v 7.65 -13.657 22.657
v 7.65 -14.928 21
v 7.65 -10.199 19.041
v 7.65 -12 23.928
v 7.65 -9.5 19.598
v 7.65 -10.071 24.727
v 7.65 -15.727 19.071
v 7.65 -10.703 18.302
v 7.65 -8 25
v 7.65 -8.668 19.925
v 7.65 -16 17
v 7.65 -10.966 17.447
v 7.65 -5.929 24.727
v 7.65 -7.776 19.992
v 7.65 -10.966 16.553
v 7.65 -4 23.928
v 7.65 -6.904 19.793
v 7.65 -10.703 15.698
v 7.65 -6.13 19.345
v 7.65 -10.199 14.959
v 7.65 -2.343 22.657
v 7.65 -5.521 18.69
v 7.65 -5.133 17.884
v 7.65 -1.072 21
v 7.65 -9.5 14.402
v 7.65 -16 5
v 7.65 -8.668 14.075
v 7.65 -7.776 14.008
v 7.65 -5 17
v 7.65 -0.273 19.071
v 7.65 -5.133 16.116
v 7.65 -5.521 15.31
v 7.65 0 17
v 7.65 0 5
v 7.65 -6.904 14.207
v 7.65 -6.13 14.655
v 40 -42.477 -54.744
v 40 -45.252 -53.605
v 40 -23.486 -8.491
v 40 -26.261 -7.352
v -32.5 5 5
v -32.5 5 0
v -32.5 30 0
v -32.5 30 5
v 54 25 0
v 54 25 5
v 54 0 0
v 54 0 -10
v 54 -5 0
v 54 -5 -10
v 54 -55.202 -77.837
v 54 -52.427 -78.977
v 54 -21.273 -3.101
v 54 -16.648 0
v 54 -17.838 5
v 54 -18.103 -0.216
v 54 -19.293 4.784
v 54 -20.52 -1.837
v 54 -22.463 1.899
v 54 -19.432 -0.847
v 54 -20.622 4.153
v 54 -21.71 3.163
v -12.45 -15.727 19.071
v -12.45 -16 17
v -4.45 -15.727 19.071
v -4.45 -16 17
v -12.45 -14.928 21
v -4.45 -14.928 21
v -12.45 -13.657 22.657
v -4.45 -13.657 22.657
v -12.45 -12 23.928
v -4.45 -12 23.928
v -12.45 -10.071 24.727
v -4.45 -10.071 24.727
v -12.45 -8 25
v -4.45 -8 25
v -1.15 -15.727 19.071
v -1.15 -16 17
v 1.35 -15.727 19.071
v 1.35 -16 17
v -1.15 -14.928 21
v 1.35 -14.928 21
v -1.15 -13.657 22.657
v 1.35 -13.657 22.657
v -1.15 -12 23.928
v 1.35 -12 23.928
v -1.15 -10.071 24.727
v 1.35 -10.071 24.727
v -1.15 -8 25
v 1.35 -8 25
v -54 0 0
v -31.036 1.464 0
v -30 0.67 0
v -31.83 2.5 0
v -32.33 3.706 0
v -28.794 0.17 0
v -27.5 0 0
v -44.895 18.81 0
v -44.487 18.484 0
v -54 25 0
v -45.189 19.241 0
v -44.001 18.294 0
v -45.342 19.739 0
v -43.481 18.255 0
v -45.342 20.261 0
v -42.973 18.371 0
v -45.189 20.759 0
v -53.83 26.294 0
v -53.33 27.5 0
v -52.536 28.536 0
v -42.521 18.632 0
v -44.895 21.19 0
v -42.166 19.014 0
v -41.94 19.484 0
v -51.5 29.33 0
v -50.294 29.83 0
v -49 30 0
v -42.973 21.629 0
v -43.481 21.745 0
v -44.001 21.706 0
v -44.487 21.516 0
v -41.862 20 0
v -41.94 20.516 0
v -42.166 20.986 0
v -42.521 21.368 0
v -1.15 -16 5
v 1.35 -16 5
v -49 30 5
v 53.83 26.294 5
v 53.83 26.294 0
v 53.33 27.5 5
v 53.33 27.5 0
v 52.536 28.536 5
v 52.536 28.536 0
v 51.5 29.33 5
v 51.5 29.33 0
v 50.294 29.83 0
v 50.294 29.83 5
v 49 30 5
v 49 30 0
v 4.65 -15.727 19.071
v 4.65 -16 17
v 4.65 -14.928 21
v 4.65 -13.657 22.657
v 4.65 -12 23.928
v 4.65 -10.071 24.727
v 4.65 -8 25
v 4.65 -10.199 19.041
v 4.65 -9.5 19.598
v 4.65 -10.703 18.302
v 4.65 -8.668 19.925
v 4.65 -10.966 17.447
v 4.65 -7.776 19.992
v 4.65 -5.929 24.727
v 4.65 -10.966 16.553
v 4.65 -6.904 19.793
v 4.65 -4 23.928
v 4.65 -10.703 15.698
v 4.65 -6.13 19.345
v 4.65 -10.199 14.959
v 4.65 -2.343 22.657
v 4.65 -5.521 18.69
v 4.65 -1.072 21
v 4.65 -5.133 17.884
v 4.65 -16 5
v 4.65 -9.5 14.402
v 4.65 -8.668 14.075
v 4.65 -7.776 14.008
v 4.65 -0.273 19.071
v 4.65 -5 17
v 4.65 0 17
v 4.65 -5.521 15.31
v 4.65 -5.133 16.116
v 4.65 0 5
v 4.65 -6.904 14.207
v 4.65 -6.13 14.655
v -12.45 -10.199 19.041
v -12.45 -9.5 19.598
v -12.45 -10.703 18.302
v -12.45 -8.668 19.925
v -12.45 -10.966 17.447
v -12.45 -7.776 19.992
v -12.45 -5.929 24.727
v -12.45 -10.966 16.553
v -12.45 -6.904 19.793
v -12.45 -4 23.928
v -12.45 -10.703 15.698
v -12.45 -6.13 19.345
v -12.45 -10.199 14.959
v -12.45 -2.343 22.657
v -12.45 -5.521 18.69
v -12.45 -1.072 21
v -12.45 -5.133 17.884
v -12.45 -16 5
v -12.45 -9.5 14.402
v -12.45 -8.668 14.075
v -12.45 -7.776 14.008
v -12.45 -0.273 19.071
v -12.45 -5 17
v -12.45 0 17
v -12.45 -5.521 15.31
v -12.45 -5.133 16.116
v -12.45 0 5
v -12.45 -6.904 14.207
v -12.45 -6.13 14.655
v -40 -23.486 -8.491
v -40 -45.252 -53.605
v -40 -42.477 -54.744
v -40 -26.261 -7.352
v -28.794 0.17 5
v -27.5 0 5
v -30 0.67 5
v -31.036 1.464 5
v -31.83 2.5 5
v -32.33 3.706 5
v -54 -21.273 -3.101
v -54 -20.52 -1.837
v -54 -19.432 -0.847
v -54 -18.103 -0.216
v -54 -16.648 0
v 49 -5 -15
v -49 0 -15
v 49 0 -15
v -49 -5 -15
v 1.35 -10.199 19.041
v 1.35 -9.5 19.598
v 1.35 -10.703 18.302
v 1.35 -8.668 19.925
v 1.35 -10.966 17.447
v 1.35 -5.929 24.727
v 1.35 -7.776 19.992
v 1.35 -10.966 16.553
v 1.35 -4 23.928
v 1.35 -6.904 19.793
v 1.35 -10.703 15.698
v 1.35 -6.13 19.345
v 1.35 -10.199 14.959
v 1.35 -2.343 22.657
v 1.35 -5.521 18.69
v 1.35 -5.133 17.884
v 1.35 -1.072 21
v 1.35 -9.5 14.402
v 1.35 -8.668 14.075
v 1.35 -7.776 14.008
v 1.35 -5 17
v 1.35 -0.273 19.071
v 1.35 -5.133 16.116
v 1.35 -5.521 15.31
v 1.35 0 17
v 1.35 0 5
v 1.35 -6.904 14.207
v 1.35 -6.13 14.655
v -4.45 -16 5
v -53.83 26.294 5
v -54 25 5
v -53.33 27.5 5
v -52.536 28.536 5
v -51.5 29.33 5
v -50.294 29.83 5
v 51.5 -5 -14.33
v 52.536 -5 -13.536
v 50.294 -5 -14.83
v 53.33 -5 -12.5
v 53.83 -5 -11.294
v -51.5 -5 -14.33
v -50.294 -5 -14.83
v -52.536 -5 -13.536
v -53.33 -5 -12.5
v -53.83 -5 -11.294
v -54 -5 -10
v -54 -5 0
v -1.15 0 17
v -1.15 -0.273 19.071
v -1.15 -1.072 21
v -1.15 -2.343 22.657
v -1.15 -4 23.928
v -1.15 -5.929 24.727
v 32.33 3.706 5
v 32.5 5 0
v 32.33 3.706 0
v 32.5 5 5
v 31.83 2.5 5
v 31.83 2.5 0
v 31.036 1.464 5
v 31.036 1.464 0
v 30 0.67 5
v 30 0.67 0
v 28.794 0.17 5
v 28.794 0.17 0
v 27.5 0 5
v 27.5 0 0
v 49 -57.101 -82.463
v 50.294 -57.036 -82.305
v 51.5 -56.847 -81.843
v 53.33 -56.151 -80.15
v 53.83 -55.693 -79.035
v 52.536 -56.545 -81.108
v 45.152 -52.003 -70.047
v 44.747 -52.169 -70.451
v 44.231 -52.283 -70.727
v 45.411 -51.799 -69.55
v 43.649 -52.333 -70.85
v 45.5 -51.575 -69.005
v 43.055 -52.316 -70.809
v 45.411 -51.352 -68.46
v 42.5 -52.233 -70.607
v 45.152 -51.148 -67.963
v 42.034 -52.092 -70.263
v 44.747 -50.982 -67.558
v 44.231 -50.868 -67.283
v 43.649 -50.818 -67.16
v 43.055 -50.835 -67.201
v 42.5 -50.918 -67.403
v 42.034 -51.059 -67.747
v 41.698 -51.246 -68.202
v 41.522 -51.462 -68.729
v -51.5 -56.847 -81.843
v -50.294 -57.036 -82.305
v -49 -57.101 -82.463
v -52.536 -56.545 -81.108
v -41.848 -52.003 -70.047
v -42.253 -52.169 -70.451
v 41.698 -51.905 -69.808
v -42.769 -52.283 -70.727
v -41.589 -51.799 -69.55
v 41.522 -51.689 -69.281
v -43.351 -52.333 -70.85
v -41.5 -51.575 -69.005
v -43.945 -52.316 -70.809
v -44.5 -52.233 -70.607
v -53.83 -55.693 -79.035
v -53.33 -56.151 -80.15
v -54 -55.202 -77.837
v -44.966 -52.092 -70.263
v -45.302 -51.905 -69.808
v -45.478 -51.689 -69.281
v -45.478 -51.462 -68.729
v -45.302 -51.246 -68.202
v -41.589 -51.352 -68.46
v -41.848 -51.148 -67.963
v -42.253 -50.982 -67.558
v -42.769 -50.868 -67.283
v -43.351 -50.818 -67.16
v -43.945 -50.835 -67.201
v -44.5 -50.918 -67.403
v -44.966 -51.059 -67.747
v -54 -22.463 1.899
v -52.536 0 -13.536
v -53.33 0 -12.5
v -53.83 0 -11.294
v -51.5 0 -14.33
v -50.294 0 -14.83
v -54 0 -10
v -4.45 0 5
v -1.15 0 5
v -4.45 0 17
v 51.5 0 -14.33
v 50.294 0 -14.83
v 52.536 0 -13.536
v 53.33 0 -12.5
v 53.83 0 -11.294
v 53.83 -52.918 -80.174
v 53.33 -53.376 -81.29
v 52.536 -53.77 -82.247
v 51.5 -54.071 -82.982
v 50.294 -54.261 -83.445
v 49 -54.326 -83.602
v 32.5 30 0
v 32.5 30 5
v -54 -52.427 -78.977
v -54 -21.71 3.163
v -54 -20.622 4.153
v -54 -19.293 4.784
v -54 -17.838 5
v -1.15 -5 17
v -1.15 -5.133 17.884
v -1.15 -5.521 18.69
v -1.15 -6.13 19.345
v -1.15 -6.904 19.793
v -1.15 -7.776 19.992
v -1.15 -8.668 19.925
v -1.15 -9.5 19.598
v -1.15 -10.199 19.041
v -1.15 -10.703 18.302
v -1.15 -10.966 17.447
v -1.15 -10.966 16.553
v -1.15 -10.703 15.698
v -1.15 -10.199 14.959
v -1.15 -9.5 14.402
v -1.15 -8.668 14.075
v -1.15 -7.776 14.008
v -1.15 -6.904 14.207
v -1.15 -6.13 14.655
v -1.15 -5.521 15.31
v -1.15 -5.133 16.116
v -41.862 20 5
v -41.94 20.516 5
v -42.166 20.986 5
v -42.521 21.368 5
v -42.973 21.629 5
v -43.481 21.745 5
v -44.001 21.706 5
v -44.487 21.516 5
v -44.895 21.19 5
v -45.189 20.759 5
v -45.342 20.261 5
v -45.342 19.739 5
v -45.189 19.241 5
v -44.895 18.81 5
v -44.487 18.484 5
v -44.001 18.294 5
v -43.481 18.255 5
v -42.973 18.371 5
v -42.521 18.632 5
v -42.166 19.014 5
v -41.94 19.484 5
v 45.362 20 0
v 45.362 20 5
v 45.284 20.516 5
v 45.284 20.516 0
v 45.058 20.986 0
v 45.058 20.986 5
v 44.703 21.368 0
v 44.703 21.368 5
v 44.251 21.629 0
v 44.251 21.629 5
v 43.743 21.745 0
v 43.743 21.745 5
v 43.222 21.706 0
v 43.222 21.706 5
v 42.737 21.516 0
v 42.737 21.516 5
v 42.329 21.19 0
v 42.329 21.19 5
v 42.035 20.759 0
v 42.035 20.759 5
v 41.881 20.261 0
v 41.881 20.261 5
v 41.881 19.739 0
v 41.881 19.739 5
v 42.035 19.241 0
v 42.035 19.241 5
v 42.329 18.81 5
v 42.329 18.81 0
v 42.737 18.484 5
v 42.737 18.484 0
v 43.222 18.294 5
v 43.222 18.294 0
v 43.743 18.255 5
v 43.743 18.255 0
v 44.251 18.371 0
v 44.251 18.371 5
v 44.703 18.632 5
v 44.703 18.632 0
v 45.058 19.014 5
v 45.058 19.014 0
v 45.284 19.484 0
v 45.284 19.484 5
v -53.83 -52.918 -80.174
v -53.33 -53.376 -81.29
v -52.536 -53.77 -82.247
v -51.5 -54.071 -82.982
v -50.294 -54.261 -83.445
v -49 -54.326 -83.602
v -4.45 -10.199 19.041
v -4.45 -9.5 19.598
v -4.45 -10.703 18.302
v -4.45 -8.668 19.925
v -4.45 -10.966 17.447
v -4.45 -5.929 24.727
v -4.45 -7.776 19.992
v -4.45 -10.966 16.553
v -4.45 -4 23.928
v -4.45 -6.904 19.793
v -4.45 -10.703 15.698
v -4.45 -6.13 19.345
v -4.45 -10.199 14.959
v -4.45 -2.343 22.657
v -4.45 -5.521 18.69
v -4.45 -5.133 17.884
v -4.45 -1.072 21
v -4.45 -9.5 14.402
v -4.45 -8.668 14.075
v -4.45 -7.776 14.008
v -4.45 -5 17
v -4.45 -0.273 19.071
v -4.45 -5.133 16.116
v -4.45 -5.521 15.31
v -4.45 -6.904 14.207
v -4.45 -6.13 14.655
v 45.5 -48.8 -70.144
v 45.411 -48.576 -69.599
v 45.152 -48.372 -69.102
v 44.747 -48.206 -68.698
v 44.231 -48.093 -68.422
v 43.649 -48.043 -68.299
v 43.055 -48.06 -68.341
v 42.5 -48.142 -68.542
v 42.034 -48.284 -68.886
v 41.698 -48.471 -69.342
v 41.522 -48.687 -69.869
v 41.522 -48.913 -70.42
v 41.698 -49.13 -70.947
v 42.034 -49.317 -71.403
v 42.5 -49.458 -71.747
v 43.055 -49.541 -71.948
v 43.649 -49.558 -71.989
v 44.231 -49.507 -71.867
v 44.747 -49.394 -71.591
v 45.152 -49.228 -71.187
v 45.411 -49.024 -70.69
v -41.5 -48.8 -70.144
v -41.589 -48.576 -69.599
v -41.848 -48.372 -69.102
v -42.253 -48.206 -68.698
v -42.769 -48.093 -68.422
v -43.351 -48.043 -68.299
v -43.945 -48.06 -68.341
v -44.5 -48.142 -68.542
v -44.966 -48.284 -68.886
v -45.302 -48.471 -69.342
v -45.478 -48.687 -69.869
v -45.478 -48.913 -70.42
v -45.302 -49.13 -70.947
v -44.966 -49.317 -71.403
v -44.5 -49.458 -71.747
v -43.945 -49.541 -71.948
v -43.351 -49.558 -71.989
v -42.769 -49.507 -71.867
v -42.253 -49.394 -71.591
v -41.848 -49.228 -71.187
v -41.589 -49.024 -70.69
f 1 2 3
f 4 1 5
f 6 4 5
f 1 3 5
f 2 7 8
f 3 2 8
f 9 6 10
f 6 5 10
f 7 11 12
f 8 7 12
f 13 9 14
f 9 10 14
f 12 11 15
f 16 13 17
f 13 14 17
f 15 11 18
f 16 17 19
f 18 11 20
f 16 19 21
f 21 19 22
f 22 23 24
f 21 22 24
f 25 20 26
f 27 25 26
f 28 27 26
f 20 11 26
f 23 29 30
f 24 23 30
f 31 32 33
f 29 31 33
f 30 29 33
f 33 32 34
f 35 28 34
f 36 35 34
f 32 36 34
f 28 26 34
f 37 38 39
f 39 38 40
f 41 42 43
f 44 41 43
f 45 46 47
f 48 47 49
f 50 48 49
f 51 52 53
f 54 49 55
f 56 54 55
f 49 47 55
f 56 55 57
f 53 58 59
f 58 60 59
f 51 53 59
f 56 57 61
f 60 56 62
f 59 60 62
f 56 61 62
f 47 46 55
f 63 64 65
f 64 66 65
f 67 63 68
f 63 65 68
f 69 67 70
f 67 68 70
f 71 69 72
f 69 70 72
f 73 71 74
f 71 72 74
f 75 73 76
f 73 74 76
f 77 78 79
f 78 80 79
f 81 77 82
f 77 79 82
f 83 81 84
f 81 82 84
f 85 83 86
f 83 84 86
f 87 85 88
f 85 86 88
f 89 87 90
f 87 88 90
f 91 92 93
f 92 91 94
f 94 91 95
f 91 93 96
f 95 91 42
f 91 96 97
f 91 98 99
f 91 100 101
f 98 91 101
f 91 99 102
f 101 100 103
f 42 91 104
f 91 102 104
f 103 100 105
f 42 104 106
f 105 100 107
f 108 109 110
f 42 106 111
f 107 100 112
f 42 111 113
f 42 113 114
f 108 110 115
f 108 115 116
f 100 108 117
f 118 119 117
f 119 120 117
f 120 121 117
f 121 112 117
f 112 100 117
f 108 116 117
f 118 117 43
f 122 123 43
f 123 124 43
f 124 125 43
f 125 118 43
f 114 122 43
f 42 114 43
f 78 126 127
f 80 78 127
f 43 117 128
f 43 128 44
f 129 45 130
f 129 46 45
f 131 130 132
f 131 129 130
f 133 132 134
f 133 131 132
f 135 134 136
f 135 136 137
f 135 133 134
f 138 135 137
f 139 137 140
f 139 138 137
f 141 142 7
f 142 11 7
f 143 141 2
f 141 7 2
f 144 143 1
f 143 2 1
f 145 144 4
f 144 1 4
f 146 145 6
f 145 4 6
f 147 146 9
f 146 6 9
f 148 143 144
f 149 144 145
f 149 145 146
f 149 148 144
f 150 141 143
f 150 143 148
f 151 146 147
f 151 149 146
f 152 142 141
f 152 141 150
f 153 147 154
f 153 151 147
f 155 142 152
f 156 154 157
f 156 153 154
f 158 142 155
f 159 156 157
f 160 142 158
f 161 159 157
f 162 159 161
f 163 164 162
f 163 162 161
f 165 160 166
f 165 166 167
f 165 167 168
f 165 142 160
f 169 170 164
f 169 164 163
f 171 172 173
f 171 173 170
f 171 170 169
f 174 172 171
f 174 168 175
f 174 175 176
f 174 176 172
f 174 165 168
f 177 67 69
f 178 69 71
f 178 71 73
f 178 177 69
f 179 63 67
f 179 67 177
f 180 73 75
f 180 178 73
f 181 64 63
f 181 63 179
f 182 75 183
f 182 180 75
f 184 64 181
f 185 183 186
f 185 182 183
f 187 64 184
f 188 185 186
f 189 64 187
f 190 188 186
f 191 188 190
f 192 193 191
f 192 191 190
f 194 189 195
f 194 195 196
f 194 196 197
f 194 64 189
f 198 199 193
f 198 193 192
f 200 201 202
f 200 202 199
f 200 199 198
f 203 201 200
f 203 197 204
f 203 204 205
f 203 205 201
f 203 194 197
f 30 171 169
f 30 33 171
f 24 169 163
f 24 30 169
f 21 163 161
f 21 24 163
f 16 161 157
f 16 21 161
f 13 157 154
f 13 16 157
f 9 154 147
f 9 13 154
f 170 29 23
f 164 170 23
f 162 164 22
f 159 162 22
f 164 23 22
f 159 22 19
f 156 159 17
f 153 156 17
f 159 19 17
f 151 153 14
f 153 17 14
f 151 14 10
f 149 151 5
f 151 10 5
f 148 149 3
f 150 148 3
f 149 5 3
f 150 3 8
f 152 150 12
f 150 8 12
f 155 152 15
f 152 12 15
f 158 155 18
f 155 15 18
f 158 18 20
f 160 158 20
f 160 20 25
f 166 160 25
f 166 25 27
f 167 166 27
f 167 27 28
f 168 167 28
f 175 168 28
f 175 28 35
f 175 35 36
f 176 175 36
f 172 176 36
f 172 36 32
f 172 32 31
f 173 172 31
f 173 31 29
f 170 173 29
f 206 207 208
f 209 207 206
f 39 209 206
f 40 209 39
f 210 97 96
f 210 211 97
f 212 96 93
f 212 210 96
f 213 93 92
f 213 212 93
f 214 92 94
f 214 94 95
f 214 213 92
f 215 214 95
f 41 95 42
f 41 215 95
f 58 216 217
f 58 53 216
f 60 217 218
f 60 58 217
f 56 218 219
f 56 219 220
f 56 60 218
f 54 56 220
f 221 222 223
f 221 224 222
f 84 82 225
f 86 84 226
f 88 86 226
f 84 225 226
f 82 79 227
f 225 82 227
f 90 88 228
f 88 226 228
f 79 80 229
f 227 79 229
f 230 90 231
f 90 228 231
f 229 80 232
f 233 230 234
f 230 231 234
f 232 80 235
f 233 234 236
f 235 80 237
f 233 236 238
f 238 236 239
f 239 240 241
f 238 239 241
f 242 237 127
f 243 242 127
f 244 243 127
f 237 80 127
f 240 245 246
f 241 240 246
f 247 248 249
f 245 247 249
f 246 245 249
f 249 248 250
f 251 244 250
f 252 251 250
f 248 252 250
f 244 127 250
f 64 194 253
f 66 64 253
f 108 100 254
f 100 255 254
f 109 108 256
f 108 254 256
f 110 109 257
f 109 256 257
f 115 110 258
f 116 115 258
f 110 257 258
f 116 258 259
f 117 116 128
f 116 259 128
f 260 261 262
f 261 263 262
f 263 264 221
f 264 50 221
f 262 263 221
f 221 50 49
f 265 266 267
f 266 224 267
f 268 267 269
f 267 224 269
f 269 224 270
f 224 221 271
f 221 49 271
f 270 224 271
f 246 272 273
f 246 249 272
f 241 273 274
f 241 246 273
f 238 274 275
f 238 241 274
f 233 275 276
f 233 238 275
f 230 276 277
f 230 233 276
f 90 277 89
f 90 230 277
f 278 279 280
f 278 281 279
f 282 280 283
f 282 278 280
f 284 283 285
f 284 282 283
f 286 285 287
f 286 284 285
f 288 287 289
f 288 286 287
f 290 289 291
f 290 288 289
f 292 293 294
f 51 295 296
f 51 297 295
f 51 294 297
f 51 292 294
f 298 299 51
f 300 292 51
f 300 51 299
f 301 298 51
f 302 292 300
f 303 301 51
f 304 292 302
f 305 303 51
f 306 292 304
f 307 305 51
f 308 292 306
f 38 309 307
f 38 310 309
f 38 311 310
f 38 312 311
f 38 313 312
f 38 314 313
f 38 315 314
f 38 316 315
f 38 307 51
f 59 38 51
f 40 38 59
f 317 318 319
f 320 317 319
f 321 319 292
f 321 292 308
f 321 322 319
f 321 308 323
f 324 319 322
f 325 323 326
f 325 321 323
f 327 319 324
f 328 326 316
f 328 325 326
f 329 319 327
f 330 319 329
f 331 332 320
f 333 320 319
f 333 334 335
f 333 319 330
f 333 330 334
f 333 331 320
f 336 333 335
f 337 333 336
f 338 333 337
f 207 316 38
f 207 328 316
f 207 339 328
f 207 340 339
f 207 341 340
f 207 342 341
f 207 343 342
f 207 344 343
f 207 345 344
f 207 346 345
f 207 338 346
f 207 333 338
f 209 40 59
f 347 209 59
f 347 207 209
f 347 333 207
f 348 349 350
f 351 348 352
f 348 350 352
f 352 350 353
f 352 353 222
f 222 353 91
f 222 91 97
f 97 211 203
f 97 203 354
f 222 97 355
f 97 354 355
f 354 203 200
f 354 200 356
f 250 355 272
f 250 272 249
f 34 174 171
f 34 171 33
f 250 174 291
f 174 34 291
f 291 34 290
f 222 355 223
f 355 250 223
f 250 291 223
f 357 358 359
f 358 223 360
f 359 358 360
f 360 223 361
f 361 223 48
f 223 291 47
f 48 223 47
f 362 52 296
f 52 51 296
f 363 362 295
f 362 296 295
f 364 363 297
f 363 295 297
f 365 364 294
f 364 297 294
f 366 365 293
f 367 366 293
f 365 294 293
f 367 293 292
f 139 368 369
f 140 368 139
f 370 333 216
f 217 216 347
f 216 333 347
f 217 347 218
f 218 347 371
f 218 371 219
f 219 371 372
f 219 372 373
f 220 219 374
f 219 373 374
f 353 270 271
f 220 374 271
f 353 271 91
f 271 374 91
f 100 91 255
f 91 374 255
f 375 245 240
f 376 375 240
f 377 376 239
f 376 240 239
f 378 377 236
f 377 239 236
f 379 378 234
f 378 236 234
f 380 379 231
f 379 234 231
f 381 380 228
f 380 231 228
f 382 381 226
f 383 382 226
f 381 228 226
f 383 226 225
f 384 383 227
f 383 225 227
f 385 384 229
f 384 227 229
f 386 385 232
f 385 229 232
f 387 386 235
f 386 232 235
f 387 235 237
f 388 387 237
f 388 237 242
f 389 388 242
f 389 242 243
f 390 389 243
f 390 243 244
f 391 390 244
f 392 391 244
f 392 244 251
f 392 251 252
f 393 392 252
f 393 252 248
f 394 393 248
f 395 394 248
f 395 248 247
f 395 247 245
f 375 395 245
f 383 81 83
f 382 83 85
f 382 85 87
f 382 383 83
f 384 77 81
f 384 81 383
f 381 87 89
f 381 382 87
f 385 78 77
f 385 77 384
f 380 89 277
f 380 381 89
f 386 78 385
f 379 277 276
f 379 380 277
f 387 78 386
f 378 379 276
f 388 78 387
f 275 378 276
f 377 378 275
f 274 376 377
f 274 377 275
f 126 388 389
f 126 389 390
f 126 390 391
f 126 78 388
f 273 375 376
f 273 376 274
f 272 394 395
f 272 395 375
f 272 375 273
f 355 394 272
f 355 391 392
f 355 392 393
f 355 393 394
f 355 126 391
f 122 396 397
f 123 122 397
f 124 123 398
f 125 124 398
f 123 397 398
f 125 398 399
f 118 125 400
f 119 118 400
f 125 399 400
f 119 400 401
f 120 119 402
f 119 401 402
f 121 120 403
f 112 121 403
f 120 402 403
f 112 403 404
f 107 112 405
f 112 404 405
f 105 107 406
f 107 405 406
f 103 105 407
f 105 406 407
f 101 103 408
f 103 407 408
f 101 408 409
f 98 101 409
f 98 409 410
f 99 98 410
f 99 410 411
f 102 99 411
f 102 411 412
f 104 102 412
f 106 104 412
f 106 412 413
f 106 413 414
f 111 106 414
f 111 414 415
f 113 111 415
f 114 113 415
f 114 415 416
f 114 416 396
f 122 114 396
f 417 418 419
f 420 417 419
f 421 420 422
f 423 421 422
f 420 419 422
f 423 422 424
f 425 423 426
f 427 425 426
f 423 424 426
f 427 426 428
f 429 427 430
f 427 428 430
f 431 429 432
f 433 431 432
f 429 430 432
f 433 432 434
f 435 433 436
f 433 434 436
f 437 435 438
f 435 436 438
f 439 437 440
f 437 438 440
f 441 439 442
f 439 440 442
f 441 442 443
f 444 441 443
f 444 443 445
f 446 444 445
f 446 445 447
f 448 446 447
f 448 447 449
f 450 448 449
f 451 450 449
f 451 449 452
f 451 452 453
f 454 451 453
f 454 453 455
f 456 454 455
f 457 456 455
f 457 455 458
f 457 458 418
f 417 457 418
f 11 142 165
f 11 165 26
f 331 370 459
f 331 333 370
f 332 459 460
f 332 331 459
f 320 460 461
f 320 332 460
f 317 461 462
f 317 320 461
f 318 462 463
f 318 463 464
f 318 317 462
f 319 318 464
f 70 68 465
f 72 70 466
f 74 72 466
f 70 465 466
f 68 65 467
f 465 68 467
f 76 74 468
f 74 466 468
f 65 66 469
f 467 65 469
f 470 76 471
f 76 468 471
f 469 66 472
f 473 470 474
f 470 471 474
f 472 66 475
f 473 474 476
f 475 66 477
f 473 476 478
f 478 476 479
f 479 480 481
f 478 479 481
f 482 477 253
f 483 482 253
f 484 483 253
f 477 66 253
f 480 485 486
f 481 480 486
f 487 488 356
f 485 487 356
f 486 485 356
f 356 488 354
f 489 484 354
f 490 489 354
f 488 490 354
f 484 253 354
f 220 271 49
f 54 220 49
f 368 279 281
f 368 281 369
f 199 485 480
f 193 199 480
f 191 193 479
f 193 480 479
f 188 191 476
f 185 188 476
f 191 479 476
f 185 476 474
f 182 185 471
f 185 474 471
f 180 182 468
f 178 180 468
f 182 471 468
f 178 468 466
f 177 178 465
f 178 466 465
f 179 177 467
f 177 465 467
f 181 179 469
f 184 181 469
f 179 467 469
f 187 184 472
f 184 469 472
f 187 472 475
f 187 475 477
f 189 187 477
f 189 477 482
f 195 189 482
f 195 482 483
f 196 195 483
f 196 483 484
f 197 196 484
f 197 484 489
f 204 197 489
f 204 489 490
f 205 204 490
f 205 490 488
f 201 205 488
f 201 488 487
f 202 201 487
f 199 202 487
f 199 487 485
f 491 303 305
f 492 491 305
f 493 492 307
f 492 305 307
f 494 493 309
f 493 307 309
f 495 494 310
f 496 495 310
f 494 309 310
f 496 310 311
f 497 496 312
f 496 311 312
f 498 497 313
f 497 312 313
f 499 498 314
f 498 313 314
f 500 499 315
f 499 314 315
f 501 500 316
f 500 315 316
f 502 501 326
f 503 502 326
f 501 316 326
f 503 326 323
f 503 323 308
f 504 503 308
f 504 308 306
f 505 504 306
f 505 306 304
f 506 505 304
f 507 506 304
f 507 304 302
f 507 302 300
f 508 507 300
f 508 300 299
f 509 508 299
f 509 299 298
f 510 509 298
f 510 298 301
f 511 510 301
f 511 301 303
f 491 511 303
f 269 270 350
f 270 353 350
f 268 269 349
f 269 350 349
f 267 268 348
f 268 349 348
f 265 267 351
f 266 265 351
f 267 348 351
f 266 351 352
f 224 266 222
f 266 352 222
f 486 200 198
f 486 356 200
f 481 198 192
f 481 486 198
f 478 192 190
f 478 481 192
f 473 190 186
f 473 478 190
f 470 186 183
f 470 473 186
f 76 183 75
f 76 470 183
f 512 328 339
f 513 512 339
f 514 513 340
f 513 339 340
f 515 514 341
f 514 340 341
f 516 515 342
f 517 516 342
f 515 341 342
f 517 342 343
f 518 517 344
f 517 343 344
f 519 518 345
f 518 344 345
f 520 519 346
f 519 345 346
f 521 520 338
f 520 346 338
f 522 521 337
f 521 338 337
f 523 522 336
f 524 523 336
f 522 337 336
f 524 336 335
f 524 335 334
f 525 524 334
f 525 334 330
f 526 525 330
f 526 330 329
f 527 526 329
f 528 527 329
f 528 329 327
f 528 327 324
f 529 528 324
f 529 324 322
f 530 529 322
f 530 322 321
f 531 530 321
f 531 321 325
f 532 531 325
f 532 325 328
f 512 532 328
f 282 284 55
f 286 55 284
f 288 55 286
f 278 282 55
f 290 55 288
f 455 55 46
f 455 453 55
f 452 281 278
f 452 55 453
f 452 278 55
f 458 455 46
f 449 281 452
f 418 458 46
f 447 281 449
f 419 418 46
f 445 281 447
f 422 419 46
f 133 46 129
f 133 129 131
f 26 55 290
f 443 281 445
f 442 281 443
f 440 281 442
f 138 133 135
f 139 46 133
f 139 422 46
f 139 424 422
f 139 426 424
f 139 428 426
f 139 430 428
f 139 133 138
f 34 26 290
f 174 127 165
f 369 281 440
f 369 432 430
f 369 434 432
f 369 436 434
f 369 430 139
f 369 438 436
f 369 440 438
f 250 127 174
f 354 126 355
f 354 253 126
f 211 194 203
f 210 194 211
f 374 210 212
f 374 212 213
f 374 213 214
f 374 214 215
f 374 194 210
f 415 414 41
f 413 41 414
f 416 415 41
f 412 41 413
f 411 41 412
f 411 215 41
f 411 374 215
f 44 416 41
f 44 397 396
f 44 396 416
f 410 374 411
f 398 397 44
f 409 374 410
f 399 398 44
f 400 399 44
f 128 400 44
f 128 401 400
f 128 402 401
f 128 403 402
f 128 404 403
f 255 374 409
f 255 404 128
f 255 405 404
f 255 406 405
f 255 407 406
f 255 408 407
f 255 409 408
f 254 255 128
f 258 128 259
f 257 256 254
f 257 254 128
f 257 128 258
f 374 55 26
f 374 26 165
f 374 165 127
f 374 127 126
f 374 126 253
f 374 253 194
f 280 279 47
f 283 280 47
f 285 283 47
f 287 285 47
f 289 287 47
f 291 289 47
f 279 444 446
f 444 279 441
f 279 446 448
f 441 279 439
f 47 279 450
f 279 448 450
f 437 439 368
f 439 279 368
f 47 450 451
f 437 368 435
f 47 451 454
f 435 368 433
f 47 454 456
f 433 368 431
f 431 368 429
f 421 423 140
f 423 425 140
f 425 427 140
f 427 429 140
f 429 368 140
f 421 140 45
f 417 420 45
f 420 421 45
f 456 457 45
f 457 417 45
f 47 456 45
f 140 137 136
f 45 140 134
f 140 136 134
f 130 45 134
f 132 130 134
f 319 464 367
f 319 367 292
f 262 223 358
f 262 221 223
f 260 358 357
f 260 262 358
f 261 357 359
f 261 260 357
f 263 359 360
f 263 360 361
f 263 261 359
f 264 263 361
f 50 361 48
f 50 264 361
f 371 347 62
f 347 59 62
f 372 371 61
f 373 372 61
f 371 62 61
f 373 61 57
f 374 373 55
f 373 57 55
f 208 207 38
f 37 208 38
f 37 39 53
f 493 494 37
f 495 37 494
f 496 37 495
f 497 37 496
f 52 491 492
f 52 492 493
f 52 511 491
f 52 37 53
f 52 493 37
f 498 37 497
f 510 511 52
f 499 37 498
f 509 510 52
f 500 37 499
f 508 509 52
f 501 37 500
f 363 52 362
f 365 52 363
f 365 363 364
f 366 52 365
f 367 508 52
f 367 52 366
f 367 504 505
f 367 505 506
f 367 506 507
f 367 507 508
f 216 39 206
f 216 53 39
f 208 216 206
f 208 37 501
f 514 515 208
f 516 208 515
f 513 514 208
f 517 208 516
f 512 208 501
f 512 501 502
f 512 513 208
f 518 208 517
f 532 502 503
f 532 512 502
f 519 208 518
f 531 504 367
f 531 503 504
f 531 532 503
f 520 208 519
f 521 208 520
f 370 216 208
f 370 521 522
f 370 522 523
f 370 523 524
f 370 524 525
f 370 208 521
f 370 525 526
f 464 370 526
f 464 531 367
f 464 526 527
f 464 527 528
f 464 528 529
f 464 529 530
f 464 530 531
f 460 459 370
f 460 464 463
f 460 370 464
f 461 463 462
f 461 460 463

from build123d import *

# Parameters (mm, degrees)
F0_W      = 21.5
F0_H      = 30
F1_DEPTH  = 5
F3_DEPTH  = 108
F4_R      = 2
F5_DEPTH  = 25
F7_R      = 5
F6_W      = 8
F6_H      = 16
F6_W_2    = 2.5
F6_W_3    = 3
F8_DEPTH  = 20
F9_R      = 7.99999
F10_R     = 3
F11_DEPTH = 40
F12_W     = 80
F12_H     = 50
F13_DEPTH = 25
F15_DEPTH = 15
F16_R     = 5
F17_R     = 1.75
F18_DEPTH = 25


# Not quite as in the source:
# - a fillet or chamfer is up to 0.001 mm smaller than in the source, because OpenCascade refuses the exact size


with BuildPart() as f1:
    # F0 (on Top) → F1 (new body)
    with BuildSketch(Plane.XY):
        with Locations((-43.25, 15)):
            Rectangle(F0_W, F0_H)
        Polygon((-32.5, 0), (-54, 0), (-54, -20), (54, -20), (54, 0), (32.5, 0), align=None)
        with Locations((43.25, 15)):
            Rectangle(F0_W, F0_H)
    extrude(amount=F1_DEPTH)

    # F2 (on face) → F3 (join)
    with BuildSketch(Plane(origin=(-54, 0, 0), x_dir=(0, -1, 0), z_dir=(-1, 0, 0))):
        Polygon((20, 5), (20, 0), (54.3258497444, -83.6021589144), (57.101034605, -82.4627077355), (21.1900987758, 5), align=None)
    extrude(amount=-F3_DEPTH)

    # F4 (on face) → F5 (cut)
    with BuildSketch(Plane(origin=(0, -19.8899648845, 8.1665348708), x_dir=(1, 0, 0), z_dir=(0, -0.9250616202, 0.3798170597))):
        with Locations((-43.5, -83.4230529098)):
            Circle(F4_R)
        with Locations((43.5, -83.4230529098)):
            Circle(F4_R)
    extrude(amount=-F5_DEPTH, mode=Mode.SUBTRACT)

    # F7
    f7_edges = [f1.edges().sort_by_distance(p)[0] for p in [
        (0, -21.190099, 5),
        (0, -20, 0),
        (-54, 30, 2.5),
        (54, 30, 2.5),
        (54, -55.713442, -83.032433),
        (-54, -55.713442, -83.032433),
        (-32.5, 0, 2.5),
        (32.5, 0, 2.5),
    ]]
    fillet(f7_edges, radius=F7_R)

    # F6 (on face) → F8 (join)
    with BuildSketch(Plane.XY.offset(5)):
        with Locations((-8.45, -8)):
            Rectangle(F6_W, F6_H)
        with Locations((0.1, -8)):
            Rectangle(F6_W_2, F6_H)
        with Locations((6.15, -8)):
            Rectangle(F6_W_3, F6_H)
    extrude(amount=F8_DEPTH)

    # F9 (radius 8 in the source; OpenCascade refuses exactly that, so slightly less here)
    f9_edges = [f1.edges().sort_by_distance(p)[0] for p in [
        (-8.45, -16, 25),
        (0.1, -16, 25),
        (6.15, -16, 25),
        (-8.45, 0, 25),
        (0.1, 0, 25),
        (6.15, 0, 25),
    ]]
    fillet(f9_edges, radius=F9_R)

    # F10 (on face) → F11 (cut)
    with BuildSketch(Plane.YZ.offset(7.65)):
        with Locations((-8, 17)):
            Circle(F10_R)
    extrude(amount=-F11_DEPTH, mode=Mode.SUBTRACT)

    # F12 (on face) → F13 (cut)
    with BuildSketch(Plane(origin=(0, -19.8899648845, 8.1665348708), x_dir=(1, 0, 0), z_dir=(0, -0.9250616202, 0.3798170597))):
        with Locations((0, -41.7751698217)):
            Rectangle(F12_W, F12_H)
    extrude(amount=-F13_DEPTH, mode=Mode.SUBTRACT)

    # F14 (on face) → F15 (join)
    with BuildSketch(Plane(origin=(0, 0, 0), x_dir=(1, 0, 0), z_dir=(0, 0, -1))):
        Polygon((-54, 5), (-54, 0), (-27.5, 0), (27.5, 0), (54, 0), (54, 5), align=None)
    extrude(amount=F15_DEPTH)

    # F16
    f16_edges = [f1.edges().sort_by_distance(p)[0] for p in [
        (54, -2.5, -15),
        (-54, -2.5, -15),
    ]]
    fillet(f16_edges, radius=F16_R)

    # F17 (on face) → F18 (cut)
    with BuildSketch(Plane.XY.offset(5)):
        with Locations((-43.6119101942, 20)):
            Circle(F17_R)
        with Locations((43.6119101942, 20)):
            Circle(F17_R)
    extrude(amount=-F18_DEPTH, mode=Mode.SUBTRACT)


solid = f1.part
